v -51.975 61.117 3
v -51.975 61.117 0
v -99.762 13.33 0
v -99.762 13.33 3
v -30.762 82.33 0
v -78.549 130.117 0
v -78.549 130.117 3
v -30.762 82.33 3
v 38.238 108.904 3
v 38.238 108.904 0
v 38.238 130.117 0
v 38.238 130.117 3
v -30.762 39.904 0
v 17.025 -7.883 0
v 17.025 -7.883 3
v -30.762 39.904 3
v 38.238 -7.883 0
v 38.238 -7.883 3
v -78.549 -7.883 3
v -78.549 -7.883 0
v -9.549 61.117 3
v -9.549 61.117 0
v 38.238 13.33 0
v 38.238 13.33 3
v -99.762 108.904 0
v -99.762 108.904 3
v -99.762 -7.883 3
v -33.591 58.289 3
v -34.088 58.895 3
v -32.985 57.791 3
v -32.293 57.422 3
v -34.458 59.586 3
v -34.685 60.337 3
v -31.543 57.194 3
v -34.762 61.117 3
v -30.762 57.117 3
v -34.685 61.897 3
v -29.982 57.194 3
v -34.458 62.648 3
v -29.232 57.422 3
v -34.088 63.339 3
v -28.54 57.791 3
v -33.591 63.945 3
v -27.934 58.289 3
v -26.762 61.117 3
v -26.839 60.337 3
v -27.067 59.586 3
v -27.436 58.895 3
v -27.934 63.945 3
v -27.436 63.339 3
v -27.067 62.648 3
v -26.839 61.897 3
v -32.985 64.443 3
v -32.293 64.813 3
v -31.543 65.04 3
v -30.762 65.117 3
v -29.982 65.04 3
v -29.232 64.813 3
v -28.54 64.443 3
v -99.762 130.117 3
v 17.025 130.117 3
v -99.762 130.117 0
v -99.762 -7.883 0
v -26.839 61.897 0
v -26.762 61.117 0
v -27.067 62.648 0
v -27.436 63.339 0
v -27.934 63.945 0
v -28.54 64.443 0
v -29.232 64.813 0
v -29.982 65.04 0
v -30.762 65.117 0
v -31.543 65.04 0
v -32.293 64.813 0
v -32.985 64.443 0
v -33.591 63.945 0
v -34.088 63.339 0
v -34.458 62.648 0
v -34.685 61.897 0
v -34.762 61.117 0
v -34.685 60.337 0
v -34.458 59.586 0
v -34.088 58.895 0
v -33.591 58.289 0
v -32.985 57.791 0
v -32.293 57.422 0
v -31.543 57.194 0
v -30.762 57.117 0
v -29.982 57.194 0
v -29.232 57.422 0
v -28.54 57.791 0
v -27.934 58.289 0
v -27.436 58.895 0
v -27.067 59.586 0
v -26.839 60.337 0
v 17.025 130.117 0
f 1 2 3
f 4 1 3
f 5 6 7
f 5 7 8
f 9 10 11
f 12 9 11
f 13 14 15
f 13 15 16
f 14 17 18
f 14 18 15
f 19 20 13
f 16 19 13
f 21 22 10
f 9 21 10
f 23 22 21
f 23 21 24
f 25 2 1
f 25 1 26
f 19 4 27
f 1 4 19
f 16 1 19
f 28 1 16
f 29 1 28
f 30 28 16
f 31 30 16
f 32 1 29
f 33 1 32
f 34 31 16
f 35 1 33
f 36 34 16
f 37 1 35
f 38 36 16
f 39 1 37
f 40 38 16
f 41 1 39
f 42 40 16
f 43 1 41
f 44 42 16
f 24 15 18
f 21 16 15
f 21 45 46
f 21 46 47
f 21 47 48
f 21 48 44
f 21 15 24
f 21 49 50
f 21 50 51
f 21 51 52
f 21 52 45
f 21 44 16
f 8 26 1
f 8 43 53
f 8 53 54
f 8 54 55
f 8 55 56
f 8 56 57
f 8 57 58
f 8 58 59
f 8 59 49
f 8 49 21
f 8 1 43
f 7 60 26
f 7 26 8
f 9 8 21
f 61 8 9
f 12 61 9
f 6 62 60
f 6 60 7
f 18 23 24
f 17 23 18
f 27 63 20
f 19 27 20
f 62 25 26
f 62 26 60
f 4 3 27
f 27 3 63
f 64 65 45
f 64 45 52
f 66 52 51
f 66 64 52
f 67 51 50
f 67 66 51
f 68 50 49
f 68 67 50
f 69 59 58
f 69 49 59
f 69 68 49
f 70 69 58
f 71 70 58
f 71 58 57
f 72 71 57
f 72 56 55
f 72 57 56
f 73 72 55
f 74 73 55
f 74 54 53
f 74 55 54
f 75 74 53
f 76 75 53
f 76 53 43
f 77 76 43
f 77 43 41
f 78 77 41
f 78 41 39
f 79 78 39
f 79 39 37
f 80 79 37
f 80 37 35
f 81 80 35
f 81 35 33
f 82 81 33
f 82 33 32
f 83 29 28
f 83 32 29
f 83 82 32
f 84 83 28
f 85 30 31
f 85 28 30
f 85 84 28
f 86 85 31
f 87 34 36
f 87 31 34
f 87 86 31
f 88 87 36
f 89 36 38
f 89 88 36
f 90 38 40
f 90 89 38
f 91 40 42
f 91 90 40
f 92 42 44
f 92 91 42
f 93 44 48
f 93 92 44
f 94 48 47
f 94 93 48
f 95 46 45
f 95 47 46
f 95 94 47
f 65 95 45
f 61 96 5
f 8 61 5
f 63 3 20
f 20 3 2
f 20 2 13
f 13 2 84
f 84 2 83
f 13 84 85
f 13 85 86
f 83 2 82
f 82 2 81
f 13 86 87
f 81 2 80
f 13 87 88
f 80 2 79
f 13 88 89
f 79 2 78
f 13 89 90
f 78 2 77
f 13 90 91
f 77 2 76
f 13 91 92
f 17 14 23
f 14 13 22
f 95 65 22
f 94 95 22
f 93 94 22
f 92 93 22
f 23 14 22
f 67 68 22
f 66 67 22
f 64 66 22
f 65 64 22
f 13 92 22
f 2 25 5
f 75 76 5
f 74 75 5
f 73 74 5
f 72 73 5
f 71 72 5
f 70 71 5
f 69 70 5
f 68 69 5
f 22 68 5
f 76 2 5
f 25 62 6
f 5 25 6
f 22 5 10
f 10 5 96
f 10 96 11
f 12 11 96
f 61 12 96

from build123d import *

# Parameters (mm, degrees)
BOSS_EXTRUDE1_DEPTH     = 3
BOSS_EXTRUDE2_DEPTH     = 3
CUT_EXTRUDE1_DEPTH      = 164.987660837
CUT_EXTRUDE1_DEPTH_BACK = 164.987660837
SKETCH9_R               = 4


with BuildPart() as part:
    # Sketch7 → Boss-Extrude1 (new body)
    with BuildSketch(Plane.XY):
        Polygon((-78.549032868, 130.117059275), (38.237763696, 13.33026271), (38.237763696, -7.882940725), (17.02456026, -7.882940725), (-99.762236304, 108.903855839), (-99.762236304, 130.117059275), align=None)
    extrude(amount=BOSS_EXTRUDE1_DEPTH)

    # Sketch8 → Boss-Extrude2 (add)
    with BuildSketch(Plane.XY):
        Polygon((-78.549032868, -7.882940725), (38.237763696, 108.903855839), (38.237763696, 130.117059275), (17.02456026, 130.117059275), (-99.762236304, 13.33026271), (-99.762236304, -7.882940725), align=None)
    extrude(amount=BOSS_EXTRUDE2_DEPTH)

    # Sketch9 → Cut-Extrude1 (cut, two sides: drawn at the far end of the back side and taken through both)
    with BuildSketch(Plane.XY.offset(3).offset(-CUT_EXTRUDE1_DEPTH_BACK)):
        with Locations((-30.762236304, 61.117059275)):
            Circle(SKETCH9_R)
    extrude(amount=CUT_EXTRUDE1_DEPTH + CUT_EXTRUDE1_DEPTH_BACK, mode=Mode.SUBTRACT)


solid = part.part
